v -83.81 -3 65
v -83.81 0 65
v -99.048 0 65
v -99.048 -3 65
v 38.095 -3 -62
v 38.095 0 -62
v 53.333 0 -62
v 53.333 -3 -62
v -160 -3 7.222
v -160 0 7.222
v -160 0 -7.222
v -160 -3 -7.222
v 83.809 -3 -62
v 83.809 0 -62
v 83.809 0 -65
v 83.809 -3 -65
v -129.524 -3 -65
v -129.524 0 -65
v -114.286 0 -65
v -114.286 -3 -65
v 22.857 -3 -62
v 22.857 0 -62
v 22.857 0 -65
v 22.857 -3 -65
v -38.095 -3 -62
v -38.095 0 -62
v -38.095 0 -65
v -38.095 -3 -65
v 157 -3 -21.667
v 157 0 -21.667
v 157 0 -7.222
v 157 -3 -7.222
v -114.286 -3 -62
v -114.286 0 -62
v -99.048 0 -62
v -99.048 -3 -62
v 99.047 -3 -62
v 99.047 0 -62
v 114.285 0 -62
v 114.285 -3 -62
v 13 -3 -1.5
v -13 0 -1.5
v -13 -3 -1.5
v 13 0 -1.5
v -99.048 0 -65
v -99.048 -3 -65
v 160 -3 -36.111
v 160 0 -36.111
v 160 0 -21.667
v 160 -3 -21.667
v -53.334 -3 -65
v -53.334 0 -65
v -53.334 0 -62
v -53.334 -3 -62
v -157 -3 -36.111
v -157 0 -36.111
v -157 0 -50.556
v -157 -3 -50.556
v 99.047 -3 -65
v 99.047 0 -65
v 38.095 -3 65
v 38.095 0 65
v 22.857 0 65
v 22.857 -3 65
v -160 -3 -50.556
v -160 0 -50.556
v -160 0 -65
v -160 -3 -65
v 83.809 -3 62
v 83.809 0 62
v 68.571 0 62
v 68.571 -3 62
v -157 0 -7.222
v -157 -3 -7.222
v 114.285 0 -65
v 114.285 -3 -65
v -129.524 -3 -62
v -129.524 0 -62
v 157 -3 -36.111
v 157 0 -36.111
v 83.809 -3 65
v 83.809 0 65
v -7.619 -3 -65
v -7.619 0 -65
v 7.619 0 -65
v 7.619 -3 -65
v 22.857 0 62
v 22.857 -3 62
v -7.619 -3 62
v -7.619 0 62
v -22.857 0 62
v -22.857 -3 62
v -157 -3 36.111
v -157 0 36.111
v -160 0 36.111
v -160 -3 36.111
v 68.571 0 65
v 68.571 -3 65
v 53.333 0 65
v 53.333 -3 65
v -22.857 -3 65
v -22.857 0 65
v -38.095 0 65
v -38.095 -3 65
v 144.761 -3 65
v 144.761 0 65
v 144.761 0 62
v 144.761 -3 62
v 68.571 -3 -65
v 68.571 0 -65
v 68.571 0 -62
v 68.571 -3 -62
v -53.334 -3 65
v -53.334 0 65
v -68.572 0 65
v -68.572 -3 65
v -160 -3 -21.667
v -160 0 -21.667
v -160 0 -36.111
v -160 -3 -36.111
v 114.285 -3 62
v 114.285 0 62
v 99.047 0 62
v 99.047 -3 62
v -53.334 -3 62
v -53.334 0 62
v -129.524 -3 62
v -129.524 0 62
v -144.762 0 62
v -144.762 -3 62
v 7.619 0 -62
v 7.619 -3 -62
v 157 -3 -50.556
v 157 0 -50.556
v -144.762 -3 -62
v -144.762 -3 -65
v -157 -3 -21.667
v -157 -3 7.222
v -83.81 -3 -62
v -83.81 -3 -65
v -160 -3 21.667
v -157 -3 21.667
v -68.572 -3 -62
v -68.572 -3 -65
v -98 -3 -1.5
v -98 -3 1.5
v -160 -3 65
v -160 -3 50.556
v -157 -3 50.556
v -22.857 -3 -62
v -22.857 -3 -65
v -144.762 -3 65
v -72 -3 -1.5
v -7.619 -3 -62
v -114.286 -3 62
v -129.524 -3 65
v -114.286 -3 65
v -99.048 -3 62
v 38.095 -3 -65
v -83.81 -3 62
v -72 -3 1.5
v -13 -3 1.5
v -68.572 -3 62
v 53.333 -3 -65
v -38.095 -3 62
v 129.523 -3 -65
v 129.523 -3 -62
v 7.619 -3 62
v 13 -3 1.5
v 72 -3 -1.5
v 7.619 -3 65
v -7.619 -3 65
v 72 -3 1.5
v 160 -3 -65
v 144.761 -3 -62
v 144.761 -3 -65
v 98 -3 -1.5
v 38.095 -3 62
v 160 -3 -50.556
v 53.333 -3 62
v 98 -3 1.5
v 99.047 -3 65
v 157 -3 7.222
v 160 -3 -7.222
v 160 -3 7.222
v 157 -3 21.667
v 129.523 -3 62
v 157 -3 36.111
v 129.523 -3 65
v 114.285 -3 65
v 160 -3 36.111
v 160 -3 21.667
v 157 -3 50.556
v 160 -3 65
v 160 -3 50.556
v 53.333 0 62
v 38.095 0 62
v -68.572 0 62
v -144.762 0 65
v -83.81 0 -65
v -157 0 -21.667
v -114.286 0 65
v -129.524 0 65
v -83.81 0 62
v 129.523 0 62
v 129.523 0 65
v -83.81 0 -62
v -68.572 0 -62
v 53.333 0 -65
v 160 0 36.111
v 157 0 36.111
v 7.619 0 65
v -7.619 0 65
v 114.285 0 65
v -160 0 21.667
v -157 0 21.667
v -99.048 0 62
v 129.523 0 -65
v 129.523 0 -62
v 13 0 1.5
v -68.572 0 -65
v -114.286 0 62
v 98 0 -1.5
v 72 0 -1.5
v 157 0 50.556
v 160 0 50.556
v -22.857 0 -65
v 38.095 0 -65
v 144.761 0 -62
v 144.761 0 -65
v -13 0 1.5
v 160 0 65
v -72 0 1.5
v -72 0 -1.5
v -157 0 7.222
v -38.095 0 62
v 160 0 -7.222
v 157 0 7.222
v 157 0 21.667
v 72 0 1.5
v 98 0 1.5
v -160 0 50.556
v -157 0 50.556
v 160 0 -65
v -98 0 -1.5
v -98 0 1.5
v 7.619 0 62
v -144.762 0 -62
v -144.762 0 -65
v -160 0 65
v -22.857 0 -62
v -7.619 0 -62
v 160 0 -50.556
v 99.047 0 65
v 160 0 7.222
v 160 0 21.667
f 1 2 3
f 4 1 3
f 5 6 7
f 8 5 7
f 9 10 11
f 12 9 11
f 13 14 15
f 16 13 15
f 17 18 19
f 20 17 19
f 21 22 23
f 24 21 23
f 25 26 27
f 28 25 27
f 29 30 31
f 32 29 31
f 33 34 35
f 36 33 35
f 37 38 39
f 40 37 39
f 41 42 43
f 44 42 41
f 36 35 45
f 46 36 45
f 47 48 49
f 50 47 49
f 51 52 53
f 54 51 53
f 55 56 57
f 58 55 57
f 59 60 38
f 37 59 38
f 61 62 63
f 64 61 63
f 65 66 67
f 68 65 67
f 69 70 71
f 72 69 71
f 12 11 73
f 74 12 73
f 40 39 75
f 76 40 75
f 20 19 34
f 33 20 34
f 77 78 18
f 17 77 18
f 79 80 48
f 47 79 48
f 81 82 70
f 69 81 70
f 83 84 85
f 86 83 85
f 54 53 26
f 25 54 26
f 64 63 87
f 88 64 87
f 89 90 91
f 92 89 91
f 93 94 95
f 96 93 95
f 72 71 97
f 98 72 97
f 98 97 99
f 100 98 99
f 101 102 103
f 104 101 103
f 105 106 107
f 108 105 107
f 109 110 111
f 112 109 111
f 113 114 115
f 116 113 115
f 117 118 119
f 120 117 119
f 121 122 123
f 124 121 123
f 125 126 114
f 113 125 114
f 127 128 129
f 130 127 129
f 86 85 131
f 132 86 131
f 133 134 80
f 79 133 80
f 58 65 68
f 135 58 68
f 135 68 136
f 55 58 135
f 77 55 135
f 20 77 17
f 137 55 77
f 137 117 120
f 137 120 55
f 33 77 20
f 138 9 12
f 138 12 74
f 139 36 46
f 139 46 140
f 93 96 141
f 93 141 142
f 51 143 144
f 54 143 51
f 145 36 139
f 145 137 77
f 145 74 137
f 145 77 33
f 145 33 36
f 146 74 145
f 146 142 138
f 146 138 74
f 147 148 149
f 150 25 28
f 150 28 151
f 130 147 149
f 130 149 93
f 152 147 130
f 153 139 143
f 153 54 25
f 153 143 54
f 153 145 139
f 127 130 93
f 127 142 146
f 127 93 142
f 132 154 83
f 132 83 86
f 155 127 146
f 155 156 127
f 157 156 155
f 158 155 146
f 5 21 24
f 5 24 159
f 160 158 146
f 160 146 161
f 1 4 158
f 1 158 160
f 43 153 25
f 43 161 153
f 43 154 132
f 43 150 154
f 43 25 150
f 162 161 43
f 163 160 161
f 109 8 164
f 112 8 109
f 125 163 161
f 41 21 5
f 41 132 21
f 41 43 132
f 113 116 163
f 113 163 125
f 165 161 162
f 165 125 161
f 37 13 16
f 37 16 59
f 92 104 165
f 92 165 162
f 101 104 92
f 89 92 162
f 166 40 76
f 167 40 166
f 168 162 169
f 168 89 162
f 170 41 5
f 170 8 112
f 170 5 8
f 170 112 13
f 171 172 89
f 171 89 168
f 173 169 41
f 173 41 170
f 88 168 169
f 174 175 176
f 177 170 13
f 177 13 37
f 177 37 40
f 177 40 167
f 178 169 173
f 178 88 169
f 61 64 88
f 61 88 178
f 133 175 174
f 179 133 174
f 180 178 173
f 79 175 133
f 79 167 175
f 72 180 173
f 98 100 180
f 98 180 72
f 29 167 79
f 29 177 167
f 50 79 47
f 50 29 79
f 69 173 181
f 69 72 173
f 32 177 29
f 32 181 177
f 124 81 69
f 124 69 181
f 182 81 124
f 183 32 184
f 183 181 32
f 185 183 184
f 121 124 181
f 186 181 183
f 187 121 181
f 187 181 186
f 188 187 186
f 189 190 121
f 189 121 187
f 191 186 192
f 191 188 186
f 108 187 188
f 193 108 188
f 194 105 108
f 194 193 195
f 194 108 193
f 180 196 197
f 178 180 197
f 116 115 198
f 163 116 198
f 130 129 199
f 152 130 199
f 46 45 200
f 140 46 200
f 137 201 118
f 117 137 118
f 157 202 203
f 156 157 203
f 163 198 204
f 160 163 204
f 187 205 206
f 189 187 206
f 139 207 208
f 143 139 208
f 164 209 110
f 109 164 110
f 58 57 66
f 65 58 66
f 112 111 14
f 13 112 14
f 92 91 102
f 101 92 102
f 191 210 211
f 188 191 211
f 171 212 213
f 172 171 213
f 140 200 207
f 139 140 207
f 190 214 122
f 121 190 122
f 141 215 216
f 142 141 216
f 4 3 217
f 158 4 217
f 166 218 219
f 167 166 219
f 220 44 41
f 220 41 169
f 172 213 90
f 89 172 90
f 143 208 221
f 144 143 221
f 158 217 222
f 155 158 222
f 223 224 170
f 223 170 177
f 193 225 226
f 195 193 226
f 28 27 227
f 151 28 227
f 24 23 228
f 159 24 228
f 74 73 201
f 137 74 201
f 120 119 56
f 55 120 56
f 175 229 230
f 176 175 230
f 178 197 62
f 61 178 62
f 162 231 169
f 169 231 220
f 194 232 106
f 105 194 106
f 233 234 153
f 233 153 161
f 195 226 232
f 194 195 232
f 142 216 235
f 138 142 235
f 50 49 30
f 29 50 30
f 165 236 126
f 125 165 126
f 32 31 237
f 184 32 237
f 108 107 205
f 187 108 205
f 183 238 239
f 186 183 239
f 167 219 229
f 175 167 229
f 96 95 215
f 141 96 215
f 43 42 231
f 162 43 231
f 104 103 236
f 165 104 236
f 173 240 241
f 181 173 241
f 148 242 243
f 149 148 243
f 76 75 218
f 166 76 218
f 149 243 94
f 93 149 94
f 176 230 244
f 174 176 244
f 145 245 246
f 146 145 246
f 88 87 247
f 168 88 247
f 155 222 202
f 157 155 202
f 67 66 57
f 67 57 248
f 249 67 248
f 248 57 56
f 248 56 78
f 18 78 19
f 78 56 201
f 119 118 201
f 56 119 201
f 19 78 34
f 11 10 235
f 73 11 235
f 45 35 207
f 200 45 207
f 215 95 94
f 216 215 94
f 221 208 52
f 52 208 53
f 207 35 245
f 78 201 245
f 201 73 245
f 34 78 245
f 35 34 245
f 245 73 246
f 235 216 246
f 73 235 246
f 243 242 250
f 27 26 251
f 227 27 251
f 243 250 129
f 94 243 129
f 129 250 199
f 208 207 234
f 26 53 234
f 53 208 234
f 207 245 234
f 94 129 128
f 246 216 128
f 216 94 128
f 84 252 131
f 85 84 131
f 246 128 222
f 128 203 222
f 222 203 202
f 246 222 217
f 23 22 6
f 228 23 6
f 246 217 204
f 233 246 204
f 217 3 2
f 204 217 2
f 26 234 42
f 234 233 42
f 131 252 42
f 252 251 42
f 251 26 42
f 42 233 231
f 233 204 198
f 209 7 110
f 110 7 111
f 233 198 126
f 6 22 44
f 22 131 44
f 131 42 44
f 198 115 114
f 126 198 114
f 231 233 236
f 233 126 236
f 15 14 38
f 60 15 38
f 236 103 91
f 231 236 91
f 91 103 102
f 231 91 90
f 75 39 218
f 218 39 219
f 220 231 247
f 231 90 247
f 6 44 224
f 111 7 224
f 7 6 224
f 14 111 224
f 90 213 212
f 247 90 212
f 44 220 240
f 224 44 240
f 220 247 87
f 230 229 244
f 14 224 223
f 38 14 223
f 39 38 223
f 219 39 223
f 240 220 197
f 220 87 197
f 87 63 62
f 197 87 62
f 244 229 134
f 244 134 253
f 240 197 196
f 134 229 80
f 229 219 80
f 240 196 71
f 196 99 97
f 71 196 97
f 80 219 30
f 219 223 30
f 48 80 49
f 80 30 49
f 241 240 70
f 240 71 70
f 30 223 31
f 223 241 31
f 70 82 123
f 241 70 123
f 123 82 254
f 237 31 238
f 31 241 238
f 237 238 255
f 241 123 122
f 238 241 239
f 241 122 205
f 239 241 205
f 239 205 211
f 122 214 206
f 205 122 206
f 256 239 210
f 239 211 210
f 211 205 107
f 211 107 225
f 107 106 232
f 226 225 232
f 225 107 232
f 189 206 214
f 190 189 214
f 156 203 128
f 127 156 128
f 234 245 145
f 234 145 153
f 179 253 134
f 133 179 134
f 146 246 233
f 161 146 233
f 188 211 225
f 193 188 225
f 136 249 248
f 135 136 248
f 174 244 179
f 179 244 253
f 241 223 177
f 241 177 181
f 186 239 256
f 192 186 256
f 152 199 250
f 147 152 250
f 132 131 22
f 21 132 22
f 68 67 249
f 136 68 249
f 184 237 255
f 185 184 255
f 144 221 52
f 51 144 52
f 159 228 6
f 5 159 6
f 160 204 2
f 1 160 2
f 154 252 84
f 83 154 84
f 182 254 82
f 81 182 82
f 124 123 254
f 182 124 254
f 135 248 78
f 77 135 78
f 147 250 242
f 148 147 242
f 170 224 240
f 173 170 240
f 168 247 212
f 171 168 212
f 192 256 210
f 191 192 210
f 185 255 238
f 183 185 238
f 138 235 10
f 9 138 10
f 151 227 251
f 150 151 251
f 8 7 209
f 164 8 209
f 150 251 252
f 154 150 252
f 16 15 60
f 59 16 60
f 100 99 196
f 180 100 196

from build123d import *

# Parameters (mm, degrees)
F0_W     = 26
F0_H     = 3
F1_DEPTH = 3


with BuildPart() as f1:
    # F0 (on Front) → F1 (new body)
    with BuildSketch(Plane.XZ):
        Polygon((160, 61.999998), (160, 64.999998), (144.761429, 64.999998), (144.761429, 61.999998), (129.523333, 61.999998), (129.523333, 64.999998), (114.285238, 64.999998), (114.285238, 61.999998), (99.047143, 61.999998), (99.047143, 64.999998), (83.809048, 64.999998), (83.809048, 61.999998), (68.570952, 61.999998), (68.570952, 64.999998), (53.332952, 64.999998), (53.332952, 61.999998), (38.094952, 61.999998), (38.094952, 64.999998), (22.856952, 64.999998), (22.856952, 61.999998), (7.618857, 61.999998), (7.618857, 64.999998), (-7.619238, 64.999998), (-7.619238, 61.999998), (-22.857333, 61.999998), (-22.857333, 64.999998), (-38.095429, 64.999998), (-38.095429, 61.999998), (-53.333524, 61.999998), (-53.333524, 64.999998), (-68.571619, 64.999998), (-68.571619, 61.999998), (-83.809714, 61.999998), (-83.809714, 64.999998), (-99.047714, 64.999998), (-99.047714, 61.999998), (-114.285714, 61.999998), (-114.285714, 64.999998), (-129.52381, 64.999998), (-129.52381, 61.999998), (-144.761905, 61.999998), (-144.761905, 64.999998), (-160, 64.999998), (-160, 50.555558), (-157, 50.555558), (-157, 36.111118), (-160, 36.111118), (-160, 21.666678), (-157, 21.666678), (-157, 7.222238), (-160, 7.222238), (-160, 1.5), (-160, -1.5), (-160, -7.222202), (-157, -7.222202), (-157, -21.666642), (-160, -21.666642), (-160, -36.111082), (-157, -36.111082), (-157, -50.555526), (-160, -50.555526), (-160, -64.999998), (-144.761905, -64.999998), (-144.761905, -61.999998), (-129.52381, -61.999998), (-129.52381, -64.999998), (-114.285714, -64.999998), (-114.285714, -61.999998), (-99.047714, -61.999998), (-99.047714, -64.999998), (-83.809714, -64.999998), (-83.809714, -61.999998), (-68.571619, -61.999998), (-68.571619, -64.999998), (-53.333524, -64.999998), (-53.333524, -61.999998), (-38.095429, -61.999998), (-38.095429, -64.999998), (-22.857333, -64.999998), (-22.857333, -61.999998), (-7.619238, -61.999998), (-7.619238, -64.999998), (7.618857, -64.999998), (7.618857, -61.999998), (22.856952, -61.999998), (22.856952, -64.999998), (38.094952, -64.999998), (38.094952, -61.999998), (53.332952, -61.999998), (53.332952, -64.999998), (68.570952, -64.999998), (68.570952, -61.999998), (83.809048, -61.999998), (83.809048, -64.999998), (99.047143, -64.999998), (99.047143, -61.999998), (114.285238, -61.999998), (114.285238, -64.999998), (129.523333, -64.999998), (129.523333, -61.999998), (144.761429, -61.999998), (144.761429, -64.999998), (160, -64.999998), (160, -61.999998), (160, -50.555526), (157, -50.555526), (157, -36.111082), (160, -36.111082), (160, -21.666642), (157, -21.666642), (157, -7.222202), (160, -7.222202), (160, -1.5), (160, 1.5), (160, 7.222238), (157, 7.222238), (157, 21.666678), (160, 21.666678), (160, 36.111118), (157, 36.111118), (157, 50.555558), (160, 50.555558), align=None)
        with Locations((-85, 0)):
            Rectangle(F0_W, F0_H, mode=Mode.SUBTRACT)
        Rectangle(F0_W, F0_H, mode=Mode.SUBTRACT)
        with Locations((85, 0)):
            Rectangle(F0_W, F0_H, mode=Mode.SUBTRACT)
    extrude(amount=F1_DEPTH)


solid = f1.part
